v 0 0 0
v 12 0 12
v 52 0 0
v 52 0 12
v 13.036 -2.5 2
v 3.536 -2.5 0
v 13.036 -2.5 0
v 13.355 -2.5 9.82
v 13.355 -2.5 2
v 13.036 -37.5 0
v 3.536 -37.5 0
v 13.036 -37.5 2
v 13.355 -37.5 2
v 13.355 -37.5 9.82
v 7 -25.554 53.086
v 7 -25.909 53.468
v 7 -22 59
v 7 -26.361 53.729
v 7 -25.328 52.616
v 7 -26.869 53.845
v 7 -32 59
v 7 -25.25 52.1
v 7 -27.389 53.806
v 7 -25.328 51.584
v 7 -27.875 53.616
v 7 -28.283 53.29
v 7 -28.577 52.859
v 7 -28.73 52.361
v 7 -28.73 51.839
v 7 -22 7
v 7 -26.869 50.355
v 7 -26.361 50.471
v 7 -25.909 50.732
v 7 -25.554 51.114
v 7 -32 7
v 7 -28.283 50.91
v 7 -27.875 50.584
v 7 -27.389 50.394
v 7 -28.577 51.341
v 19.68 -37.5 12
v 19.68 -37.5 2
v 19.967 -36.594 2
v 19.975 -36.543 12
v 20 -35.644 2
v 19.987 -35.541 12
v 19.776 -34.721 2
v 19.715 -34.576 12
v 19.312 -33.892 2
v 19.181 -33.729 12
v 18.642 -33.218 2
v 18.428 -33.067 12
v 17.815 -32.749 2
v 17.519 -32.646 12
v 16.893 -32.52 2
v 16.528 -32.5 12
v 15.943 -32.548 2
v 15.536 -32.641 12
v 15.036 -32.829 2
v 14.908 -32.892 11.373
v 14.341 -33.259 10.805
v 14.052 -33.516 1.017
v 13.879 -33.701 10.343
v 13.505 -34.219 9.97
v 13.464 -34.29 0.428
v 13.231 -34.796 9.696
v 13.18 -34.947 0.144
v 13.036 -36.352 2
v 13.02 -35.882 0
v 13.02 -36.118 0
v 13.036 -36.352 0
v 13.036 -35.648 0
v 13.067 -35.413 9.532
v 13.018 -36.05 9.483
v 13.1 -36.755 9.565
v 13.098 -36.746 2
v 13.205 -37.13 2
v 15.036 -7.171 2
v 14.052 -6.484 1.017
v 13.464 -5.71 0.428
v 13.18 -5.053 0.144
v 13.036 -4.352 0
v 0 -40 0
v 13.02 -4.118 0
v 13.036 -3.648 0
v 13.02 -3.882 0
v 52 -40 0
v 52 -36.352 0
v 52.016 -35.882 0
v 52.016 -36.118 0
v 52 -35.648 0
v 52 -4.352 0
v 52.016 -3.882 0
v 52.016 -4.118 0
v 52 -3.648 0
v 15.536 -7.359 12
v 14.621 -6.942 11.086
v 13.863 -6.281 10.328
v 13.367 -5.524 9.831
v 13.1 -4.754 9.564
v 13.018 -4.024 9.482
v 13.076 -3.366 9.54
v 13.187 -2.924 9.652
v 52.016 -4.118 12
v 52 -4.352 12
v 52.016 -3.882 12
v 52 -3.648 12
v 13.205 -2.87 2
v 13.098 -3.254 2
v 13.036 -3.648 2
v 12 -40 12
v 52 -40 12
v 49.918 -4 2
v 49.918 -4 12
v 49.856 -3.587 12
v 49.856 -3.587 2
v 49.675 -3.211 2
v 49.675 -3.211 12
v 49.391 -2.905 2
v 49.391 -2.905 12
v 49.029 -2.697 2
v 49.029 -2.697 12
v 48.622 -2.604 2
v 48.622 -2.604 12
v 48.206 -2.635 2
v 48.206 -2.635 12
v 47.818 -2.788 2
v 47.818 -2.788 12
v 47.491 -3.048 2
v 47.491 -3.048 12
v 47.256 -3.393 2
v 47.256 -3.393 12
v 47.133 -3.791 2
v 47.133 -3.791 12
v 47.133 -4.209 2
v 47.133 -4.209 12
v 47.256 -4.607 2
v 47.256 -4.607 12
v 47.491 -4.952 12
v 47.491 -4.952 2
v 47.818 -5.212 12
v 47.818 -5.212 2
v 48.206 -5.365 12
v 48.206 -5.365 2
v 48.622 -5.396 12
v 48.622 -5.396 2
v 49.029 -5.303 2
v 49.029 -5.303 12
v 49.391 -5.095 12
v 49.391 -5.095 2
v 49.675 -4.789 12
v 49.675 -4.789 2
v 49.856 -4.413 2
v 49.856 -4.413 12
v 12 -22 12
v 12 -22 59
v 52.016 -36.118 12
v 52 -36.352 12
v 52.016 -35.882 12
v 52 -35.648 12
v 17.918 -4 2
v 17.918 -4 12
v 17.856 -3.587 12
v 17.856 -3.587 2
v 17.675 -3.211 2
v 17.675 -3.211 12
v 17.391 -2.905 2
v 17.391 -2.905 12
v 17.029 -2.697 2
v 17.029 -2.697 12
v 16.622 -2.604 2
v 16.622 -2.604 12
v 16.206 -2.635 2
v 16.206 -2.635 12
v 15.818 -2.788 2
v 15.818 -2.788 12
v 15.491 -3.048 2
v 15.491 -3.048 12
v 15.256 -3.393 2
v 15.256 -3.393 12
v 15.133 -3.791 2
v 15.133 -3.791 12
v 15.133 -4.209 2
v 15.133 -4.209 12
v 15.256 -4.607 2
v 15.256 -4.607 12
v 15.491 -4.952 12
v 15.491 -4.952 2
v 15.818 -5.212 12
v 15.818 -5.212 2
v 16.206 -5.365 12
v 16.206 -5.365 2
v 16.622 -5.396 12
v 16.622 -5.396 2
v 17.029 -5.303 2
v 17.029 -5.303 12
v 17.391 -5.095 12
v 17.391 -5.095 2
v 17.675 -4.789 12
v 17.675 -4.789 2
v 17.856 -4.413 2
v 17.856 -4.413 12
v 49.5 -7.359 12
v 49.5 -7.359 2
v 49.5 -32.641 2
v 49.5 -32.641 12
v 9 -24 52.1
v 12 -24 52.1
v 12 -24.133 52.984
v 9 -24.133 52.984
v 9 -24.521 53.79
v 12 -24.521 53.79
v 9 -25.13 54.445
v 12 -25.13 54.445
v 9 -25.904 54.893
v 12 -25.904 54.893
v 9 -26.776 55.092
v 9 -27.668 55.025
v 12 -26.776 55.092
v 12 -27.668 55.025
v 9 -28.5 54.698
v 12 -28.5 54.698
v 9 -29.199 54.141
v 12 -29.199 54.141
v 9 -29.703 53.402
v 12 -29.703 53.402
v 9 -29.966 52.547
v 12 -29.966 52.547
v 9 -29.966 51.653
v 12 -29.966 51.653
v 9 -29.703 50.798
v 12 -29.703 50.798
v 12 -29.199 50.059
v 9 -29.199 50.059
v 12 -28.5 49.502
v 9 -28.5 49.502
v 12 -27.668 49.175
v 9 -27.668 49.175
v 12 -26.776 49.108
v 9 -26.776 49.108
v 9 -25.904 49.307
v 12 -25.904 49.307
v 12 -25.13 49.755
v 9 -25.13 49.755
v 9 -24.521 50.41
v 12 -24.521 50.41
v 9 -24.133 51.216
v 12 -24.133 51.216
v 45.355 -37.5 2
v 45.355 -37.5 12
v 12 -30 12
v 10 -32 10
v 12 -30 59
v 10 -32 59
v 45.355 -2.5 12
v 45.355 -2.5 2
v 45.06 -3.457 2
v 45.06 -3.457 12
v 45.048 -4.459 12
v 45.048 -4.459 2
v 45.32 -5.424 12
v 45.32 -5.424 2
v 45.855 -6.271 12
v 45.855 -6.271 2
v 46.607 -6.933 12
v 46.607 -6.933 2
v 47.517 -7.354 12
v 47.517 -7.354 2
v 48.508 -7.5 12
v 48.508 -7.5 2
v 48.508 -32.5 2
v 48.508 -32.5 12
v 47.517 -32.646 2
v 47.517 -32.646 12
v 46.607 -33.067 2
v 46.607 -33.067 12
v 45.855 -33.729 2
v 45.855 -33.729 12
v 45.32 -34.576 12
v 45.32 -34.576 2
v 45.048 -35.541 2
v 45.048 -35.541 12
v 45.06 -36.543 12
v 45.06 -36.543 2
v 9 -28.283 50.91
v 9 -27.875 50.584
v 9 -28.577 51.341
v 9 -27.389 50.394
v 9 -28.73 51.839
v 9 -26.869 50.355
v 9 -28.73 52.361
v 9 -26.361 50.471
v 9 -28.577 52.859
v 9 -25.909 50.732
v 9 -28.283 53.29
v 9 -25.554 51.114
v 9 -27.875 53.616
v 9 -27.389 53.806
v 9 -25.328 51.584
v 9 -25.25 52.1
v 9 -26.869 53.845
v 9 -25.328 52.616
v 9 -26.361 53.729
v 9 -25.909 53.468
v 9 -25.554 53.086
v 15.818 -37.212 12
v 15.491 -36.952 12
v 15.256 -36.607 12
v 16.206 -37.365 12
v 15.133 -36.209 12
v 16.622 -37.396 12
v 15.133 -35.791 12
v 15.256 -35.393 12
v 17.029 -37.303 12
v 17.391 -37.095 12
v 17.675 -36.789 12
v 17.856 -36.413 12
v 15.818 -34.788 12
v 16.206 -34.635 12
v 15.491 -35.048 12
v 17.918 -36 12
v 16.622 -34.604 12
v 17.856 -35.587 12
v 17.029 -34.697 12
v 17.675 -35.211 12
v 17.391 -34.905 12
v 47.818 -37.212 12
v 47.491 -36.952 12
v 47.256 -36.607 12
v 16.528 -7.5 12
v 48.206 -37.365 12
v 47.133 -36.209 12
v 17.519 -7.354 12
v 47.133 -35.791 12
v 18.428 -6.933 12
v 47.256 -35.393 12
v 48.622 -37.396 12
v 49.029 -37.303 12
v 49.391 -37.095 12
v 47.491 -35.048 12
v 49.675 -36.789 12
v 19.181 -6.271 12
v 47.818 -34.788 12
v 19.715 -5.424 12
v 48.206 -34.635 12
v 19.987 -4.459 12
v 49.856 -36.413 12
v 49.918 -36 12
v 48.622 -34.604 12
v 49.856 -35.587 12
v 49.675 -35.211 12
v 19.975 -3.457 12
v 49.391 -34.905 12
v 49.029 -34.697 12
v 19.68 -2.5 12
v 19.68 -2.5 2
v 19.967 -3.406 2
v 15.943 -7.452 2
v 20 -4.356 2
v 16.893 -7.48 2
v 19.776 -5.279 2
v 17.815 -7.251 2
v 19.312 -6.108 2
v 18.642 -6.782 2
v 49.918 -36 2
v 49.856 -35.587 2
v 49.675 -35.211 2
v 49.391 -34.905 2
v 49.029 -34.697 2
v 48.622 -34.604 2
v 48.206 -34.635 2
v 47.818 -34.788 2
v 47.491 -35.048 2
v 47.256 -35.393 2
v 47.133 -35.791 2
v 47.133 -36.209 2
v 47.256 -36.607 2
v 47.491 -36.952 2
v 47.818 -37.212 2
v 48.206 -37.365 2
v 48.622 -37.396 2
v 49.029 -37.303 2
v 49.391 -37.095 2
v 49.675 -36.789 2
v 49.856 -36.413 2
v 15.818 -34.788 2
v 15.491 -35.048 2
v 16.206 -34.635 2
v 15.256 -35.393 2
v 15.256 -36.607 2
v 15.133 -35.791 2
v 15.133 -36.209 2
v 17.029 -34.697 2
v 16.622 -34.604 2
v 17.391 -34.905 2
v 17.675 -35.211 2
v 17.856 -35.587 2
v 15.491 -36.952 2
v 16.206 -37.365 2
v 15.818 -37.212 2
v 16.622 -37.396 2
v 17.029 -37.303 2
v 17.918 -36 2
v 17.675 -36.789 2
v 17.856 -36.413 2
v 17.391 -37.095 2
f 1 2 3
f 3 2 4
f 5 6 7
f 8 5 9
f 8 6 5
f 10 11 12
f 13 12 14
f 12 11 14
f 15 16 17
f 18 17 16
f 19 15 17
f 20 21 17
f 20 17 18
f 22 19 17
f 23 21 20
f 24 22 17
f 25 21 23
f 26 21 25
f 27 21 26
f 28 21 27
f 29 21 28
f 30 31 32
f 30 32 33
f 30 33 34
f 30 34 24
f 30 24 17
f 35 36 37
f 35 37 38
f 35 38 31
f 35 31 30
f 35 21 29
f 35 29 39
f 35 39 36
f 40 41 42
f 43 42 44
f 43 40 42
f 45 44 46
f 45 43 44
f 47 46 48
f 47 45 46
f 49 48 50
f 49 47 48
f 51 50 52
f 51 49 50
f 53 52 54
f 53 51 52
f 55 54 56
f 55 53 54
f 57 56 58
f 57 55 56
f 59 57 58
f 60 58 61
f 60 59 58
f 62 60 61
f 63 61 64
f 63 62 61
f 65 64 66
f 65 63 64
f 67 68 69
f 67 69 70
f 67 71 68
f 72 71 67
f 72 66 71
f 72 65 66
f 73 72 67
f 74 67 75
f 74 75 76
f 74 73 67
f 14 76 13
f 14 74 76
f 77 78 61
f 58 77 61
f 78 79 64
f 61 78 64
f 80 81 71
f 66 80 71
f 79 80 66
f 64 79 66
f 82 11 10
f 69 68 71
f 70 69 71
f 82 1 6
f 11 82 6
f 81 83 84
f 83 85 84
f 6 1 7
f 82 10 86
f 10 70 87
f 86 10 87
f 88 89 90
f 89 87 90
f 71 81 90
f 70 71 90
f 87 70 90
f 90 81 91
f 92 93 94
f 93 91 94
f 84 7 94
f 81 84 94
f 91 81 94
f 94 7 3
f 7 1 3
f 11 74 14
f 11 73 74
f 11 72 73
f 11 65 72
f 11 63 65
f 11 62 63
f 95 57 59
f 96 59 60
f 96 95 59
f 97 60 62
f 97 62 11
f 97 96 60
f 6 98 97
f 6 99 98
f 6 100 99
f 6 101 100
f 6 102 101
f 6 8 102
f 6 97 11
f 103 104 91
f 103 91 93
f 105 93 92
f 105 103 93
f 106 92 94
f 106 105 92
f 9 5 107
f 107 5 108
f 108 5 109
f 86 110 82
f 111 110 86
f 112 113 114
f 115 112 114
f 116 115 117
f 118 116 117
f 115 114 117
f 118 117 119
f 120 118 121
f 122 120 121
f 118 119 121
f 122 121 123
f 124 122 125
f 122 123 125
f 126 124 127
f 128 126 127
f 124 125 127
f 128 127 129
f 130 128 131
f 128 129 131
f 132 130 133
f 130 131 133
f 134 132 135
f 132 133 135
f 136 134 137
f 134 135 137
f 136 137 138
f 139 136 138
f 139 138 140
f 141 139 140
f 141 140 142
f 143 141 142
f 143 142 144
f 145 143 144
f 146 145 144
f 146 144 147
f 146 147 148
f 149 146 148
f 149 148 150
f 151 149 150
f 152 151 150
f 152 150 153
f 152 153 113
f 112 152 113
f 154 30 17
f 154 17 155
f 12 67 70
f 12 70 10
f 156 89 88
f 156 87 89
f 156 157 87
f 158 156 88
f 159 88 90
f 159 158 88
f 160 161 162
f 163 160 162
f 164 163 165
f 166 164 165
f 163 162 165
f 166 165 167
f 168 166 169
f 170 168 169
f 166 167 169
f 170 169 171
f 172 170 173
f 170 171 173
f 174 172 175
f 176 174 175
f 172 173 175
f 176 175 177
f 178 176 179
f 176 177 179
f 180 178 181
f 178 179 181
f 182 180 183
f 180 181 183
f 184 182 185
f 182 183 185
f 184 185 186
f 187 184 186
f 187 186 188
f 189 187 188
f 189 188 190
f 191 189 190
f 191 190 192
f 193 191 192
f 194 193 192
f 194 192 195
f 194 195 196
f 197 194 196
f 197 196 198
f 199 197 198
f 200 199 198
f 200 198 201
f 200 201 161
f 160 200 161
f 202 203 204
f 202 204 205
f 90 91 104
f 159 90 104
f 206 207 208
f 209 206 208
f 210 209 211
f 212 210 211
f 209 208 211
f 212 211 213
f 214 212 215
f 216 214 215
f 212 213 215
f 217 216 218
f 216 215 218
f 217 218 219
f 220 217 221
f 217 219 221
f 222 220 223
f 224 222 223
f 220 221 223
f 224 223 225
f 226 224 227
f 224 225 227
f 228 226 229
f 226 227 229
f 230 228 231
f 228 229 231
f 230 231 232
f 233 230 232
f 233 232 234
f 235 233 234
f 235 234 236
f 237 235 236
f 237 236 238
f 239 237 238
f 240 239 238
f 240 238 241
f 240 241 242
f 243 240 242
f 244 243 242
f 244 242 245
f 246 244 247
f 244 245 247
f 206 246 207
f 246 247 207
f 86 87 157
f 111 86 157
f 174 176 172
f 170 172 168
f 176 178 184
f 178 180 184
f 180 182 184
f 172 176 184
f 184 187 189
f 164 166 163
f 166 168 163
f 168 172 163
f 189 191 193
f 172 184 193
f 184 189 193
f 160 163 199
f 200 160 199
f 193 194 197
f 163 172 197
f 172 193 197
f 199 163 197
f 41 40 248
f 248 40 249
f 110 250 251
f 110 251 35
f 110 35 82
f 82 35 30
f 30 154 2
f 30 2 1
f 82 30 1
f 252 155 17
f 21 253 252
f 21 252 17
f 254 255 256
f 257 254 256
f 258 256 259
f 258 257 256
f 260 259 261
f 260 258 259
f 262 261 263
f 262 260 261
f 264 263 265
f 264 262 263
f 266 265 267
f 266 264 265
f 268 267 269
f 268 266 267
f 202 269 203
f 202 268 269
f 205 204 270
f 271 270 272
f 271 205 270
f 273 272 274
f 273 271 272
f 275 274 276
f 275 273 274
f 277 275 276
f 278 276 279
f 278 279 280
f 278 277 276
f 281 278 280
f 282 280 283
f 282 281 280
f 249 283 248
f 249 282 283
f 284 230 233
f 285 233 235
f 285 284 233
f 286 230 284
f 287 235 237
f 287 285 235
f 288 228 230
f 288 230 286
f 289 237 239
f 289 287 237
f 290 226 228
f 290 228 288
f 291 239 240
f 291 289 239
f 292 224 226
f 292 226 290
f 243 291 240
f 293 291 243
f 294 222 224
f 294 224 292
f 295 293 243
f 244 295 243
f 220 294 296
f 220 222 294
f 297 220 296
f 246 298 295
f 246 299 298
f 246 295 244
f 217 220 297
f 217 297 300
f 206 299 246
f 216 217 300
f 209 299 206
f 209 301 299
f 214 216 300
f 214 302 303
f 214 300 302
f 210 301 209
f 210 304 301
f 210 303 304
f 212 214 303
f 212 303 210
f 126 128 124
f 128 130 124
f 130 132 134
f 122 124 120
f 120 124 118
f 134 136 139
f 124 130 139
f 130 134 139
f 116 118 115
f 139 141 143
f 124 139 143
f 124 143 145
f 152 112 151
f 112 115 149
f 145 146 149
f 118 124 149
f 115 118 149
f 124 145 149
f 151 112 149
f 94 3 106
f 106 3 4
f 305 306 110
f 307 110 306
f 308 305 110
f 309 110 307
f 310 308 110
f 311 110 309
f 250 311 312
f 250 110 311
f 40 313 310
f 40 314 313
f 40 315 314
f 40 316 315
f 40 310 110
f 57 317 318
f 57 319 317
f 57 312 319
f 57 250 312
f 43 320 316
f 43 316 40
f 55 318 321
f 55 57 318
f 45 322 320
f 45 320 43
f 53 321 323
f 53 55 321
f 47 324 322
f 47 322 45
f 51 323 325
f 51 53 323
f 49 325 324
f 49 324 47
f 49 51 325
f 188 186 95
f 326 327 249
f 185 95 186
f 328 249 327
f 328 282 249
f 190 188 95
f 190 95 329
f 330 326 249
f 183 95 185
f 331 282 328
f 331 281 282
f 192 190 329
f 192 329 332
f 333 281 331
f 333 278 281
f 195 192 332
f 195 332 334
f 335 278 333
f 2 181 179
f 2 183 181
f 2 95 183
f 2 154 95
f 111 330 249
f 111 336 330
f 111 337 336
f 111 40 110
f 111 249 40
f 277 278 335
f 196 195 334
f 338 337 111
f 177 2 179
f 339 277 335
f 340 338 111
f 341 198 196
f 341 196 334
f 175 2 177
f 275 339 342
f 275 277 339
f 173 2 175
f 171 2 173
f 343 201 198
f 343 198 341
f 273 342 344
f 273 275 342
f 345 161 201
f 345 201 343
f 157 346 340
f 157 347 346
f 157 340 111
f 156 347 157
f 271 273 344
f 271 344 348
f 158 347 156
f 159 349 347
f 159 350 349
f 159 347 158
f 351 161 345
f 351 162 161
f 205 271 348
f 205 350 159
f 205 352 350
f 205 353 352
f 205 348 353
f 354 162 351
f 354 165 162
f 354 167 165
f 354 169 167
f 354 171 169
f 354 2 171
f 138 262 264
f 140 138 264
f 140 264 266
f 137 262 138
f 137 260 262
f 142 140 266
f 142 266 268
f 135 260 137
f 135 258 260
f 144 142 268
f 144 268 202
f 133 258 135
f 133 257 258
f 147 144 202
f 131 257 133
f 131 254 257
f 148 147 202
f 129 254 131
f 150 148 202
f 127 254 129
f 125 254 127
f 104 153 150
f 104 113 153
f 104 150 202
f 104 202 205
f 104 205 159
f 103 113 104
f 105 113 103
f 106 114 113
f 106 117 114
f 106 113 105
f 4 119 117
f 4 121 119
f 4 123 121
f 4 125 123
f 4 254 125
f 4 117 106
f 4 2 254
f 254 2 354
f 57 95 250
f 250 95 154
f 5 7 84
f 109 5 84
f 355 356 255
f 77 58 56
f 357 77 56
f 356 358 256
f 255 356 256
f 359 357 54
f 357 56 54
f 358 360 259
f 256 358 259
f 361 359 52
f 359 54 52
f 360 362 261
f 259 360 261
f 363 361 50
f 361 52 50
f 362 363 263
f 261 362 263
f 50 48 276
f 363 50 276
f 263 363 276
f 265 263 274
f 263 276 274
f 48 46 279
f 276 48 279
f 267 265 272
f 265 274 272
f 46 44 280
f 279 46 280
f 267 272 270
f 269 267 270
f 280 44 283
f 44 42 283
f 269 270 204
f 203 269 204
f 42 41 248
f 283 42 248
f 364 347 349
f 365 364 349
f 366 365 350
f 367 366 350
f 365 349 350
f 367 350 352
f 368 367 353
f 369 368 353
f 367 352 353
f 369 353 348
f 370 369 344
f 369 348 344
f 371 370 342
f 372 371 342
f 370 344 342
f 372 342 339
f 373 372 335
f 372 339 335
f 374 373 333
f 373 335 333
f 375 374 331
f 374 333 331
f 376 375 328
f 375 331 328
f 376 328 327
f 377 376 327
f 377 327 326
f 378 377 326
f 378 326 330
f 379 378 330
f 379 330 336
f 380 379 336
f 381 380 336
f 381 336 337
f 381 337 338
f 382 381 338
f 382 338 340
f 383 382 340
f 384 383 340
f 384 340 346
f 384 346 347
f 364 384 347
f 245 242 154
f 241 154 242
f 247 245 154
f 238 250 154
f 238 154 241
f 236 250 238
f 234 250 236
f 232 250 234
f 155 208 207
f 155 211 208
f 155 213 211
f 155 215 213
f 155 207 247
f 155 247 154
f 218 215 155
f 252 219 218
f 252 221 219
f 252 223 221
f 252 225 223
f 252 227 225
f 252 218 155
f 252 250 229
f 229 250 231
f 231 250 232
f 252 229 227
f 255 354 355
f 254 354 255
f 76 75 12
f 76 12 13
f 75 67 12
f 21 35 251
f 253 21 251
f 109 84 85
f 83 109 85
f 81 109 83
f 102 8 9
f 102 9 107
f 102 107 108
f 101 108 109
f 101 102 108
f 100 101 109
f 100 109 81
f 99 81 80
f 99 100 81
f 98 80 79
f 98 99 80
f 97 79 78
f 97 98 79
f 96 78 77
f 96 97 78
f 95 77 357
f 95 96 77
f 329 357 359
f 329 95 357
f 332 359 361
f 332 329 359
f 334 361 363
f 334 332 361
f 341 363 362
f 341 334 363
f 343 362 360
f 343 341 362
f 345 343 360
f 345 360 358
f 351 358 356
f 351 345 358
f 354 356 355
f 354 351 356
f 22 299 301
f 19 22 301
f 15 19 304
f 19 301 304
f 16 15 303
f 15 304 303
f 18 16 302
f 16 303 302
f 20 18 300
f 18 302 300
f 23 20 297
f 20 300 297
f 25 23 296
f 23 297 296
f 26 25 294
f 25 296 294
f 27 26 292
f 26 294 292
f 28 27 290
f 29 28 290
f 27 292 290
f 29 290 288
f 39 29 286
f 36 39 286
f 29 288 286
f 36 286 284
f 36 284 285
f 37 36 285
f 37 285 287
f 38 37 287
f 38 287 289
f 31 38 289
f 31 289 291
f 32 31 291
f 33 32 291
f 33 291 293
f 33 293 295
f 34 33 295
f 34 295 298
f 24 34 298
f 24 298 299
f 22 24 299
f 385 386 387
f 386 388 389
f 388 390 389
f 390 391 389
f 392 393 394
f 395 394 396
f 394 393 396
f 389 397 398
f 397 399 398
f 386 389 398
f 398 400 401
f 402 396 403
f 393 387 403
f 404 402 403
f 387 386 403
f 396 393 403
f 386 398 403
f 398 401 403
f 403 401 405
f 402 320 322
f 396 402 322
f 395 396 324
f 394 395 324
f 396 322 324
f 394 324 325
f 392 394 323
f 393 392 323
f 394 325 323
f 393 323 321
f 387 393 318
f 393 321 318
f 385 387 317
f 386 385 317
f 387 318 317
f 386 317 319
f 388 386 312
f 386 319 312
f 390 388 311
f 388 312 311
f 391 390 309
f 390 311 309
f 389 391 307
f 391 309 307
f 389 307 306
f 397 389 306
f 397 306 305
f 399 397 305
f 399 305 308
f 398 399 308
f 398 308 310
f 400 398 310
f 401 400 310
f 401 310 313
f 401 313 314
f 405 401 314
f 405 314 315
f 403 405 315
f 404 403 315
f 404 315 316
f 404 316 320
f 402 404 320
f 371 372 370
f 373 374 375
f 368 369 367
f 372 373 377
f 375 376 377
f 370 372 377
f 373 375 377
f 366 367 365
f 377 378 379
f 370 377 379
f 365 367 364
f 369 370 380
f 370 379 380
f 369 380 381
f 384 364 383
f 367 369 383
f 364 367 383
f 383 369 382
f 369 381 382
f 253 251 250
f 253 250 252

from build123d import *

# Parameters (mm, degrees)
F1_DEPTH  = 40
F2_T      = -2.5
F3_R      = 3.5
F4_DEPTH  = 12
F5_R      = 1.4
F6_DEPTH  = 12.001
F7_W      = 38.9644660941
F7_H      = 40
F8_DEPTH  = 2
F9_SIZE   = 1.99999
F12_DEPTH = 5
F13_R     = 1.75
F14_DEPTH = 12.001
F15_R     = 3
F16_DEPTH = 3
F17_SIZE  = 1.99999


# Not quite as in the source:
# - a fillet or chamfer is up to 0.001 mm smaller than in the source, because OpenCascade refuses the exact size


with BuildPart() as f1:
    # F0 (on Front) → F1 (new body)
    with BuildSketch(Plane.XZ):
        Polygon((12, 12), (0, 0), (52, 0), (52, 12), align=None)
    extrude(amount=F1_DEPTH)

    # F2
    f2_openings = [f1.faces().sort_by_distance(p)[0] for p in [
        (32, -20, 12),
        (26, -20, 0),
    ]]
    offset(amount=F2_T, openings=f2_openings, kind=Kind.INTERSECTION)

    # F3 (on face) → F4 (join, through all)
    with BuildSketch(Plane.XY.offset(12)):
        with Locations((16.517766953, -36)):
            Circle(F3_R)
        with Locations((48.517766953, -36)):
            Circle(F3_R)
        with Locations((48.517766953, -4)):
            Circle(F3_R)
        with Locations((16.517766953, -4)):
            Circle(F3_R)
    extrude(amount=-F4_DEPTH)

    # F5 (on face) → F6 (cut, through all)
    with BuildSketch(Plane.XY.offset(12)):
        with Locations((16.517766953, -4)):
            Circle(F5_R)
        with Locations((48.517766953, -4)):
            Circle(F5_R)
        with Locations((48.517766953, -36)):
            Circle(F5_R)
        with Locations((16.517766953, -36)):
            Circle(F5_R)
    extrude(amount=-F6_DEPTH, mode=Mode.SUBTRACT)

    # F7 (on face) → F8 (join)
    with BuildSketch(Plane(origin=(0, 0, 0), x_dir=(1, 0, 0), z_dir=(0, 0, -1))):
        with Locations((32.517766953, 20)):
            Rectangle(F7_W, F7_H)
    extrude(amount=-F8_DEPTH)

    # F9 (size 2 in the source; OpenCascade refuses exactly that, so slightly less here)
    f9_edges = [f1.edges().sort_by_distance(p)[0] for p in [
        (13.035534, -20, 2),
    ]]
    chamfer(f9_edges, length=F9_SIZE)

    # F11 (on offset) → F12 (join, symmetric)
    with BuildSketch(Plane.XZ.offset(27)):
        Polygon((7, 59), (7, 7), (12, 12), (12, 59), align=None)
    extrude(amount=F12_DEPTH, both=True)

    # F13 (on face) → F14 (cut, through all)
    with BuildSketch(Plane.YZ.offset(12)):
        with Locations((-27, 52.1)):
            Circle(F13_R)
    extrude(amount=-F14_DEPTH, mode=Mode.SUBTRACT)

    # F15 (on face) → F16 (cut)
    with BuildSketch(Plane.YZ.offset(12)):
        with Locations((-27, 52.1)):
            Circle(F15_R)
    extrude(amount=-F16_DEPTH, mode=Mode.SUBTRACT)

    # F17 (size 2 in the source; OpenCascade refuses exactly that, so slightly less here)
    f17_edges = [f1.edges().sort_by_distance(p)[0] for p in [
        (12, -32, 35.5),
    ]]
    chamfer(f17_edges, length=F17_SIZE)


solid = f1.part
